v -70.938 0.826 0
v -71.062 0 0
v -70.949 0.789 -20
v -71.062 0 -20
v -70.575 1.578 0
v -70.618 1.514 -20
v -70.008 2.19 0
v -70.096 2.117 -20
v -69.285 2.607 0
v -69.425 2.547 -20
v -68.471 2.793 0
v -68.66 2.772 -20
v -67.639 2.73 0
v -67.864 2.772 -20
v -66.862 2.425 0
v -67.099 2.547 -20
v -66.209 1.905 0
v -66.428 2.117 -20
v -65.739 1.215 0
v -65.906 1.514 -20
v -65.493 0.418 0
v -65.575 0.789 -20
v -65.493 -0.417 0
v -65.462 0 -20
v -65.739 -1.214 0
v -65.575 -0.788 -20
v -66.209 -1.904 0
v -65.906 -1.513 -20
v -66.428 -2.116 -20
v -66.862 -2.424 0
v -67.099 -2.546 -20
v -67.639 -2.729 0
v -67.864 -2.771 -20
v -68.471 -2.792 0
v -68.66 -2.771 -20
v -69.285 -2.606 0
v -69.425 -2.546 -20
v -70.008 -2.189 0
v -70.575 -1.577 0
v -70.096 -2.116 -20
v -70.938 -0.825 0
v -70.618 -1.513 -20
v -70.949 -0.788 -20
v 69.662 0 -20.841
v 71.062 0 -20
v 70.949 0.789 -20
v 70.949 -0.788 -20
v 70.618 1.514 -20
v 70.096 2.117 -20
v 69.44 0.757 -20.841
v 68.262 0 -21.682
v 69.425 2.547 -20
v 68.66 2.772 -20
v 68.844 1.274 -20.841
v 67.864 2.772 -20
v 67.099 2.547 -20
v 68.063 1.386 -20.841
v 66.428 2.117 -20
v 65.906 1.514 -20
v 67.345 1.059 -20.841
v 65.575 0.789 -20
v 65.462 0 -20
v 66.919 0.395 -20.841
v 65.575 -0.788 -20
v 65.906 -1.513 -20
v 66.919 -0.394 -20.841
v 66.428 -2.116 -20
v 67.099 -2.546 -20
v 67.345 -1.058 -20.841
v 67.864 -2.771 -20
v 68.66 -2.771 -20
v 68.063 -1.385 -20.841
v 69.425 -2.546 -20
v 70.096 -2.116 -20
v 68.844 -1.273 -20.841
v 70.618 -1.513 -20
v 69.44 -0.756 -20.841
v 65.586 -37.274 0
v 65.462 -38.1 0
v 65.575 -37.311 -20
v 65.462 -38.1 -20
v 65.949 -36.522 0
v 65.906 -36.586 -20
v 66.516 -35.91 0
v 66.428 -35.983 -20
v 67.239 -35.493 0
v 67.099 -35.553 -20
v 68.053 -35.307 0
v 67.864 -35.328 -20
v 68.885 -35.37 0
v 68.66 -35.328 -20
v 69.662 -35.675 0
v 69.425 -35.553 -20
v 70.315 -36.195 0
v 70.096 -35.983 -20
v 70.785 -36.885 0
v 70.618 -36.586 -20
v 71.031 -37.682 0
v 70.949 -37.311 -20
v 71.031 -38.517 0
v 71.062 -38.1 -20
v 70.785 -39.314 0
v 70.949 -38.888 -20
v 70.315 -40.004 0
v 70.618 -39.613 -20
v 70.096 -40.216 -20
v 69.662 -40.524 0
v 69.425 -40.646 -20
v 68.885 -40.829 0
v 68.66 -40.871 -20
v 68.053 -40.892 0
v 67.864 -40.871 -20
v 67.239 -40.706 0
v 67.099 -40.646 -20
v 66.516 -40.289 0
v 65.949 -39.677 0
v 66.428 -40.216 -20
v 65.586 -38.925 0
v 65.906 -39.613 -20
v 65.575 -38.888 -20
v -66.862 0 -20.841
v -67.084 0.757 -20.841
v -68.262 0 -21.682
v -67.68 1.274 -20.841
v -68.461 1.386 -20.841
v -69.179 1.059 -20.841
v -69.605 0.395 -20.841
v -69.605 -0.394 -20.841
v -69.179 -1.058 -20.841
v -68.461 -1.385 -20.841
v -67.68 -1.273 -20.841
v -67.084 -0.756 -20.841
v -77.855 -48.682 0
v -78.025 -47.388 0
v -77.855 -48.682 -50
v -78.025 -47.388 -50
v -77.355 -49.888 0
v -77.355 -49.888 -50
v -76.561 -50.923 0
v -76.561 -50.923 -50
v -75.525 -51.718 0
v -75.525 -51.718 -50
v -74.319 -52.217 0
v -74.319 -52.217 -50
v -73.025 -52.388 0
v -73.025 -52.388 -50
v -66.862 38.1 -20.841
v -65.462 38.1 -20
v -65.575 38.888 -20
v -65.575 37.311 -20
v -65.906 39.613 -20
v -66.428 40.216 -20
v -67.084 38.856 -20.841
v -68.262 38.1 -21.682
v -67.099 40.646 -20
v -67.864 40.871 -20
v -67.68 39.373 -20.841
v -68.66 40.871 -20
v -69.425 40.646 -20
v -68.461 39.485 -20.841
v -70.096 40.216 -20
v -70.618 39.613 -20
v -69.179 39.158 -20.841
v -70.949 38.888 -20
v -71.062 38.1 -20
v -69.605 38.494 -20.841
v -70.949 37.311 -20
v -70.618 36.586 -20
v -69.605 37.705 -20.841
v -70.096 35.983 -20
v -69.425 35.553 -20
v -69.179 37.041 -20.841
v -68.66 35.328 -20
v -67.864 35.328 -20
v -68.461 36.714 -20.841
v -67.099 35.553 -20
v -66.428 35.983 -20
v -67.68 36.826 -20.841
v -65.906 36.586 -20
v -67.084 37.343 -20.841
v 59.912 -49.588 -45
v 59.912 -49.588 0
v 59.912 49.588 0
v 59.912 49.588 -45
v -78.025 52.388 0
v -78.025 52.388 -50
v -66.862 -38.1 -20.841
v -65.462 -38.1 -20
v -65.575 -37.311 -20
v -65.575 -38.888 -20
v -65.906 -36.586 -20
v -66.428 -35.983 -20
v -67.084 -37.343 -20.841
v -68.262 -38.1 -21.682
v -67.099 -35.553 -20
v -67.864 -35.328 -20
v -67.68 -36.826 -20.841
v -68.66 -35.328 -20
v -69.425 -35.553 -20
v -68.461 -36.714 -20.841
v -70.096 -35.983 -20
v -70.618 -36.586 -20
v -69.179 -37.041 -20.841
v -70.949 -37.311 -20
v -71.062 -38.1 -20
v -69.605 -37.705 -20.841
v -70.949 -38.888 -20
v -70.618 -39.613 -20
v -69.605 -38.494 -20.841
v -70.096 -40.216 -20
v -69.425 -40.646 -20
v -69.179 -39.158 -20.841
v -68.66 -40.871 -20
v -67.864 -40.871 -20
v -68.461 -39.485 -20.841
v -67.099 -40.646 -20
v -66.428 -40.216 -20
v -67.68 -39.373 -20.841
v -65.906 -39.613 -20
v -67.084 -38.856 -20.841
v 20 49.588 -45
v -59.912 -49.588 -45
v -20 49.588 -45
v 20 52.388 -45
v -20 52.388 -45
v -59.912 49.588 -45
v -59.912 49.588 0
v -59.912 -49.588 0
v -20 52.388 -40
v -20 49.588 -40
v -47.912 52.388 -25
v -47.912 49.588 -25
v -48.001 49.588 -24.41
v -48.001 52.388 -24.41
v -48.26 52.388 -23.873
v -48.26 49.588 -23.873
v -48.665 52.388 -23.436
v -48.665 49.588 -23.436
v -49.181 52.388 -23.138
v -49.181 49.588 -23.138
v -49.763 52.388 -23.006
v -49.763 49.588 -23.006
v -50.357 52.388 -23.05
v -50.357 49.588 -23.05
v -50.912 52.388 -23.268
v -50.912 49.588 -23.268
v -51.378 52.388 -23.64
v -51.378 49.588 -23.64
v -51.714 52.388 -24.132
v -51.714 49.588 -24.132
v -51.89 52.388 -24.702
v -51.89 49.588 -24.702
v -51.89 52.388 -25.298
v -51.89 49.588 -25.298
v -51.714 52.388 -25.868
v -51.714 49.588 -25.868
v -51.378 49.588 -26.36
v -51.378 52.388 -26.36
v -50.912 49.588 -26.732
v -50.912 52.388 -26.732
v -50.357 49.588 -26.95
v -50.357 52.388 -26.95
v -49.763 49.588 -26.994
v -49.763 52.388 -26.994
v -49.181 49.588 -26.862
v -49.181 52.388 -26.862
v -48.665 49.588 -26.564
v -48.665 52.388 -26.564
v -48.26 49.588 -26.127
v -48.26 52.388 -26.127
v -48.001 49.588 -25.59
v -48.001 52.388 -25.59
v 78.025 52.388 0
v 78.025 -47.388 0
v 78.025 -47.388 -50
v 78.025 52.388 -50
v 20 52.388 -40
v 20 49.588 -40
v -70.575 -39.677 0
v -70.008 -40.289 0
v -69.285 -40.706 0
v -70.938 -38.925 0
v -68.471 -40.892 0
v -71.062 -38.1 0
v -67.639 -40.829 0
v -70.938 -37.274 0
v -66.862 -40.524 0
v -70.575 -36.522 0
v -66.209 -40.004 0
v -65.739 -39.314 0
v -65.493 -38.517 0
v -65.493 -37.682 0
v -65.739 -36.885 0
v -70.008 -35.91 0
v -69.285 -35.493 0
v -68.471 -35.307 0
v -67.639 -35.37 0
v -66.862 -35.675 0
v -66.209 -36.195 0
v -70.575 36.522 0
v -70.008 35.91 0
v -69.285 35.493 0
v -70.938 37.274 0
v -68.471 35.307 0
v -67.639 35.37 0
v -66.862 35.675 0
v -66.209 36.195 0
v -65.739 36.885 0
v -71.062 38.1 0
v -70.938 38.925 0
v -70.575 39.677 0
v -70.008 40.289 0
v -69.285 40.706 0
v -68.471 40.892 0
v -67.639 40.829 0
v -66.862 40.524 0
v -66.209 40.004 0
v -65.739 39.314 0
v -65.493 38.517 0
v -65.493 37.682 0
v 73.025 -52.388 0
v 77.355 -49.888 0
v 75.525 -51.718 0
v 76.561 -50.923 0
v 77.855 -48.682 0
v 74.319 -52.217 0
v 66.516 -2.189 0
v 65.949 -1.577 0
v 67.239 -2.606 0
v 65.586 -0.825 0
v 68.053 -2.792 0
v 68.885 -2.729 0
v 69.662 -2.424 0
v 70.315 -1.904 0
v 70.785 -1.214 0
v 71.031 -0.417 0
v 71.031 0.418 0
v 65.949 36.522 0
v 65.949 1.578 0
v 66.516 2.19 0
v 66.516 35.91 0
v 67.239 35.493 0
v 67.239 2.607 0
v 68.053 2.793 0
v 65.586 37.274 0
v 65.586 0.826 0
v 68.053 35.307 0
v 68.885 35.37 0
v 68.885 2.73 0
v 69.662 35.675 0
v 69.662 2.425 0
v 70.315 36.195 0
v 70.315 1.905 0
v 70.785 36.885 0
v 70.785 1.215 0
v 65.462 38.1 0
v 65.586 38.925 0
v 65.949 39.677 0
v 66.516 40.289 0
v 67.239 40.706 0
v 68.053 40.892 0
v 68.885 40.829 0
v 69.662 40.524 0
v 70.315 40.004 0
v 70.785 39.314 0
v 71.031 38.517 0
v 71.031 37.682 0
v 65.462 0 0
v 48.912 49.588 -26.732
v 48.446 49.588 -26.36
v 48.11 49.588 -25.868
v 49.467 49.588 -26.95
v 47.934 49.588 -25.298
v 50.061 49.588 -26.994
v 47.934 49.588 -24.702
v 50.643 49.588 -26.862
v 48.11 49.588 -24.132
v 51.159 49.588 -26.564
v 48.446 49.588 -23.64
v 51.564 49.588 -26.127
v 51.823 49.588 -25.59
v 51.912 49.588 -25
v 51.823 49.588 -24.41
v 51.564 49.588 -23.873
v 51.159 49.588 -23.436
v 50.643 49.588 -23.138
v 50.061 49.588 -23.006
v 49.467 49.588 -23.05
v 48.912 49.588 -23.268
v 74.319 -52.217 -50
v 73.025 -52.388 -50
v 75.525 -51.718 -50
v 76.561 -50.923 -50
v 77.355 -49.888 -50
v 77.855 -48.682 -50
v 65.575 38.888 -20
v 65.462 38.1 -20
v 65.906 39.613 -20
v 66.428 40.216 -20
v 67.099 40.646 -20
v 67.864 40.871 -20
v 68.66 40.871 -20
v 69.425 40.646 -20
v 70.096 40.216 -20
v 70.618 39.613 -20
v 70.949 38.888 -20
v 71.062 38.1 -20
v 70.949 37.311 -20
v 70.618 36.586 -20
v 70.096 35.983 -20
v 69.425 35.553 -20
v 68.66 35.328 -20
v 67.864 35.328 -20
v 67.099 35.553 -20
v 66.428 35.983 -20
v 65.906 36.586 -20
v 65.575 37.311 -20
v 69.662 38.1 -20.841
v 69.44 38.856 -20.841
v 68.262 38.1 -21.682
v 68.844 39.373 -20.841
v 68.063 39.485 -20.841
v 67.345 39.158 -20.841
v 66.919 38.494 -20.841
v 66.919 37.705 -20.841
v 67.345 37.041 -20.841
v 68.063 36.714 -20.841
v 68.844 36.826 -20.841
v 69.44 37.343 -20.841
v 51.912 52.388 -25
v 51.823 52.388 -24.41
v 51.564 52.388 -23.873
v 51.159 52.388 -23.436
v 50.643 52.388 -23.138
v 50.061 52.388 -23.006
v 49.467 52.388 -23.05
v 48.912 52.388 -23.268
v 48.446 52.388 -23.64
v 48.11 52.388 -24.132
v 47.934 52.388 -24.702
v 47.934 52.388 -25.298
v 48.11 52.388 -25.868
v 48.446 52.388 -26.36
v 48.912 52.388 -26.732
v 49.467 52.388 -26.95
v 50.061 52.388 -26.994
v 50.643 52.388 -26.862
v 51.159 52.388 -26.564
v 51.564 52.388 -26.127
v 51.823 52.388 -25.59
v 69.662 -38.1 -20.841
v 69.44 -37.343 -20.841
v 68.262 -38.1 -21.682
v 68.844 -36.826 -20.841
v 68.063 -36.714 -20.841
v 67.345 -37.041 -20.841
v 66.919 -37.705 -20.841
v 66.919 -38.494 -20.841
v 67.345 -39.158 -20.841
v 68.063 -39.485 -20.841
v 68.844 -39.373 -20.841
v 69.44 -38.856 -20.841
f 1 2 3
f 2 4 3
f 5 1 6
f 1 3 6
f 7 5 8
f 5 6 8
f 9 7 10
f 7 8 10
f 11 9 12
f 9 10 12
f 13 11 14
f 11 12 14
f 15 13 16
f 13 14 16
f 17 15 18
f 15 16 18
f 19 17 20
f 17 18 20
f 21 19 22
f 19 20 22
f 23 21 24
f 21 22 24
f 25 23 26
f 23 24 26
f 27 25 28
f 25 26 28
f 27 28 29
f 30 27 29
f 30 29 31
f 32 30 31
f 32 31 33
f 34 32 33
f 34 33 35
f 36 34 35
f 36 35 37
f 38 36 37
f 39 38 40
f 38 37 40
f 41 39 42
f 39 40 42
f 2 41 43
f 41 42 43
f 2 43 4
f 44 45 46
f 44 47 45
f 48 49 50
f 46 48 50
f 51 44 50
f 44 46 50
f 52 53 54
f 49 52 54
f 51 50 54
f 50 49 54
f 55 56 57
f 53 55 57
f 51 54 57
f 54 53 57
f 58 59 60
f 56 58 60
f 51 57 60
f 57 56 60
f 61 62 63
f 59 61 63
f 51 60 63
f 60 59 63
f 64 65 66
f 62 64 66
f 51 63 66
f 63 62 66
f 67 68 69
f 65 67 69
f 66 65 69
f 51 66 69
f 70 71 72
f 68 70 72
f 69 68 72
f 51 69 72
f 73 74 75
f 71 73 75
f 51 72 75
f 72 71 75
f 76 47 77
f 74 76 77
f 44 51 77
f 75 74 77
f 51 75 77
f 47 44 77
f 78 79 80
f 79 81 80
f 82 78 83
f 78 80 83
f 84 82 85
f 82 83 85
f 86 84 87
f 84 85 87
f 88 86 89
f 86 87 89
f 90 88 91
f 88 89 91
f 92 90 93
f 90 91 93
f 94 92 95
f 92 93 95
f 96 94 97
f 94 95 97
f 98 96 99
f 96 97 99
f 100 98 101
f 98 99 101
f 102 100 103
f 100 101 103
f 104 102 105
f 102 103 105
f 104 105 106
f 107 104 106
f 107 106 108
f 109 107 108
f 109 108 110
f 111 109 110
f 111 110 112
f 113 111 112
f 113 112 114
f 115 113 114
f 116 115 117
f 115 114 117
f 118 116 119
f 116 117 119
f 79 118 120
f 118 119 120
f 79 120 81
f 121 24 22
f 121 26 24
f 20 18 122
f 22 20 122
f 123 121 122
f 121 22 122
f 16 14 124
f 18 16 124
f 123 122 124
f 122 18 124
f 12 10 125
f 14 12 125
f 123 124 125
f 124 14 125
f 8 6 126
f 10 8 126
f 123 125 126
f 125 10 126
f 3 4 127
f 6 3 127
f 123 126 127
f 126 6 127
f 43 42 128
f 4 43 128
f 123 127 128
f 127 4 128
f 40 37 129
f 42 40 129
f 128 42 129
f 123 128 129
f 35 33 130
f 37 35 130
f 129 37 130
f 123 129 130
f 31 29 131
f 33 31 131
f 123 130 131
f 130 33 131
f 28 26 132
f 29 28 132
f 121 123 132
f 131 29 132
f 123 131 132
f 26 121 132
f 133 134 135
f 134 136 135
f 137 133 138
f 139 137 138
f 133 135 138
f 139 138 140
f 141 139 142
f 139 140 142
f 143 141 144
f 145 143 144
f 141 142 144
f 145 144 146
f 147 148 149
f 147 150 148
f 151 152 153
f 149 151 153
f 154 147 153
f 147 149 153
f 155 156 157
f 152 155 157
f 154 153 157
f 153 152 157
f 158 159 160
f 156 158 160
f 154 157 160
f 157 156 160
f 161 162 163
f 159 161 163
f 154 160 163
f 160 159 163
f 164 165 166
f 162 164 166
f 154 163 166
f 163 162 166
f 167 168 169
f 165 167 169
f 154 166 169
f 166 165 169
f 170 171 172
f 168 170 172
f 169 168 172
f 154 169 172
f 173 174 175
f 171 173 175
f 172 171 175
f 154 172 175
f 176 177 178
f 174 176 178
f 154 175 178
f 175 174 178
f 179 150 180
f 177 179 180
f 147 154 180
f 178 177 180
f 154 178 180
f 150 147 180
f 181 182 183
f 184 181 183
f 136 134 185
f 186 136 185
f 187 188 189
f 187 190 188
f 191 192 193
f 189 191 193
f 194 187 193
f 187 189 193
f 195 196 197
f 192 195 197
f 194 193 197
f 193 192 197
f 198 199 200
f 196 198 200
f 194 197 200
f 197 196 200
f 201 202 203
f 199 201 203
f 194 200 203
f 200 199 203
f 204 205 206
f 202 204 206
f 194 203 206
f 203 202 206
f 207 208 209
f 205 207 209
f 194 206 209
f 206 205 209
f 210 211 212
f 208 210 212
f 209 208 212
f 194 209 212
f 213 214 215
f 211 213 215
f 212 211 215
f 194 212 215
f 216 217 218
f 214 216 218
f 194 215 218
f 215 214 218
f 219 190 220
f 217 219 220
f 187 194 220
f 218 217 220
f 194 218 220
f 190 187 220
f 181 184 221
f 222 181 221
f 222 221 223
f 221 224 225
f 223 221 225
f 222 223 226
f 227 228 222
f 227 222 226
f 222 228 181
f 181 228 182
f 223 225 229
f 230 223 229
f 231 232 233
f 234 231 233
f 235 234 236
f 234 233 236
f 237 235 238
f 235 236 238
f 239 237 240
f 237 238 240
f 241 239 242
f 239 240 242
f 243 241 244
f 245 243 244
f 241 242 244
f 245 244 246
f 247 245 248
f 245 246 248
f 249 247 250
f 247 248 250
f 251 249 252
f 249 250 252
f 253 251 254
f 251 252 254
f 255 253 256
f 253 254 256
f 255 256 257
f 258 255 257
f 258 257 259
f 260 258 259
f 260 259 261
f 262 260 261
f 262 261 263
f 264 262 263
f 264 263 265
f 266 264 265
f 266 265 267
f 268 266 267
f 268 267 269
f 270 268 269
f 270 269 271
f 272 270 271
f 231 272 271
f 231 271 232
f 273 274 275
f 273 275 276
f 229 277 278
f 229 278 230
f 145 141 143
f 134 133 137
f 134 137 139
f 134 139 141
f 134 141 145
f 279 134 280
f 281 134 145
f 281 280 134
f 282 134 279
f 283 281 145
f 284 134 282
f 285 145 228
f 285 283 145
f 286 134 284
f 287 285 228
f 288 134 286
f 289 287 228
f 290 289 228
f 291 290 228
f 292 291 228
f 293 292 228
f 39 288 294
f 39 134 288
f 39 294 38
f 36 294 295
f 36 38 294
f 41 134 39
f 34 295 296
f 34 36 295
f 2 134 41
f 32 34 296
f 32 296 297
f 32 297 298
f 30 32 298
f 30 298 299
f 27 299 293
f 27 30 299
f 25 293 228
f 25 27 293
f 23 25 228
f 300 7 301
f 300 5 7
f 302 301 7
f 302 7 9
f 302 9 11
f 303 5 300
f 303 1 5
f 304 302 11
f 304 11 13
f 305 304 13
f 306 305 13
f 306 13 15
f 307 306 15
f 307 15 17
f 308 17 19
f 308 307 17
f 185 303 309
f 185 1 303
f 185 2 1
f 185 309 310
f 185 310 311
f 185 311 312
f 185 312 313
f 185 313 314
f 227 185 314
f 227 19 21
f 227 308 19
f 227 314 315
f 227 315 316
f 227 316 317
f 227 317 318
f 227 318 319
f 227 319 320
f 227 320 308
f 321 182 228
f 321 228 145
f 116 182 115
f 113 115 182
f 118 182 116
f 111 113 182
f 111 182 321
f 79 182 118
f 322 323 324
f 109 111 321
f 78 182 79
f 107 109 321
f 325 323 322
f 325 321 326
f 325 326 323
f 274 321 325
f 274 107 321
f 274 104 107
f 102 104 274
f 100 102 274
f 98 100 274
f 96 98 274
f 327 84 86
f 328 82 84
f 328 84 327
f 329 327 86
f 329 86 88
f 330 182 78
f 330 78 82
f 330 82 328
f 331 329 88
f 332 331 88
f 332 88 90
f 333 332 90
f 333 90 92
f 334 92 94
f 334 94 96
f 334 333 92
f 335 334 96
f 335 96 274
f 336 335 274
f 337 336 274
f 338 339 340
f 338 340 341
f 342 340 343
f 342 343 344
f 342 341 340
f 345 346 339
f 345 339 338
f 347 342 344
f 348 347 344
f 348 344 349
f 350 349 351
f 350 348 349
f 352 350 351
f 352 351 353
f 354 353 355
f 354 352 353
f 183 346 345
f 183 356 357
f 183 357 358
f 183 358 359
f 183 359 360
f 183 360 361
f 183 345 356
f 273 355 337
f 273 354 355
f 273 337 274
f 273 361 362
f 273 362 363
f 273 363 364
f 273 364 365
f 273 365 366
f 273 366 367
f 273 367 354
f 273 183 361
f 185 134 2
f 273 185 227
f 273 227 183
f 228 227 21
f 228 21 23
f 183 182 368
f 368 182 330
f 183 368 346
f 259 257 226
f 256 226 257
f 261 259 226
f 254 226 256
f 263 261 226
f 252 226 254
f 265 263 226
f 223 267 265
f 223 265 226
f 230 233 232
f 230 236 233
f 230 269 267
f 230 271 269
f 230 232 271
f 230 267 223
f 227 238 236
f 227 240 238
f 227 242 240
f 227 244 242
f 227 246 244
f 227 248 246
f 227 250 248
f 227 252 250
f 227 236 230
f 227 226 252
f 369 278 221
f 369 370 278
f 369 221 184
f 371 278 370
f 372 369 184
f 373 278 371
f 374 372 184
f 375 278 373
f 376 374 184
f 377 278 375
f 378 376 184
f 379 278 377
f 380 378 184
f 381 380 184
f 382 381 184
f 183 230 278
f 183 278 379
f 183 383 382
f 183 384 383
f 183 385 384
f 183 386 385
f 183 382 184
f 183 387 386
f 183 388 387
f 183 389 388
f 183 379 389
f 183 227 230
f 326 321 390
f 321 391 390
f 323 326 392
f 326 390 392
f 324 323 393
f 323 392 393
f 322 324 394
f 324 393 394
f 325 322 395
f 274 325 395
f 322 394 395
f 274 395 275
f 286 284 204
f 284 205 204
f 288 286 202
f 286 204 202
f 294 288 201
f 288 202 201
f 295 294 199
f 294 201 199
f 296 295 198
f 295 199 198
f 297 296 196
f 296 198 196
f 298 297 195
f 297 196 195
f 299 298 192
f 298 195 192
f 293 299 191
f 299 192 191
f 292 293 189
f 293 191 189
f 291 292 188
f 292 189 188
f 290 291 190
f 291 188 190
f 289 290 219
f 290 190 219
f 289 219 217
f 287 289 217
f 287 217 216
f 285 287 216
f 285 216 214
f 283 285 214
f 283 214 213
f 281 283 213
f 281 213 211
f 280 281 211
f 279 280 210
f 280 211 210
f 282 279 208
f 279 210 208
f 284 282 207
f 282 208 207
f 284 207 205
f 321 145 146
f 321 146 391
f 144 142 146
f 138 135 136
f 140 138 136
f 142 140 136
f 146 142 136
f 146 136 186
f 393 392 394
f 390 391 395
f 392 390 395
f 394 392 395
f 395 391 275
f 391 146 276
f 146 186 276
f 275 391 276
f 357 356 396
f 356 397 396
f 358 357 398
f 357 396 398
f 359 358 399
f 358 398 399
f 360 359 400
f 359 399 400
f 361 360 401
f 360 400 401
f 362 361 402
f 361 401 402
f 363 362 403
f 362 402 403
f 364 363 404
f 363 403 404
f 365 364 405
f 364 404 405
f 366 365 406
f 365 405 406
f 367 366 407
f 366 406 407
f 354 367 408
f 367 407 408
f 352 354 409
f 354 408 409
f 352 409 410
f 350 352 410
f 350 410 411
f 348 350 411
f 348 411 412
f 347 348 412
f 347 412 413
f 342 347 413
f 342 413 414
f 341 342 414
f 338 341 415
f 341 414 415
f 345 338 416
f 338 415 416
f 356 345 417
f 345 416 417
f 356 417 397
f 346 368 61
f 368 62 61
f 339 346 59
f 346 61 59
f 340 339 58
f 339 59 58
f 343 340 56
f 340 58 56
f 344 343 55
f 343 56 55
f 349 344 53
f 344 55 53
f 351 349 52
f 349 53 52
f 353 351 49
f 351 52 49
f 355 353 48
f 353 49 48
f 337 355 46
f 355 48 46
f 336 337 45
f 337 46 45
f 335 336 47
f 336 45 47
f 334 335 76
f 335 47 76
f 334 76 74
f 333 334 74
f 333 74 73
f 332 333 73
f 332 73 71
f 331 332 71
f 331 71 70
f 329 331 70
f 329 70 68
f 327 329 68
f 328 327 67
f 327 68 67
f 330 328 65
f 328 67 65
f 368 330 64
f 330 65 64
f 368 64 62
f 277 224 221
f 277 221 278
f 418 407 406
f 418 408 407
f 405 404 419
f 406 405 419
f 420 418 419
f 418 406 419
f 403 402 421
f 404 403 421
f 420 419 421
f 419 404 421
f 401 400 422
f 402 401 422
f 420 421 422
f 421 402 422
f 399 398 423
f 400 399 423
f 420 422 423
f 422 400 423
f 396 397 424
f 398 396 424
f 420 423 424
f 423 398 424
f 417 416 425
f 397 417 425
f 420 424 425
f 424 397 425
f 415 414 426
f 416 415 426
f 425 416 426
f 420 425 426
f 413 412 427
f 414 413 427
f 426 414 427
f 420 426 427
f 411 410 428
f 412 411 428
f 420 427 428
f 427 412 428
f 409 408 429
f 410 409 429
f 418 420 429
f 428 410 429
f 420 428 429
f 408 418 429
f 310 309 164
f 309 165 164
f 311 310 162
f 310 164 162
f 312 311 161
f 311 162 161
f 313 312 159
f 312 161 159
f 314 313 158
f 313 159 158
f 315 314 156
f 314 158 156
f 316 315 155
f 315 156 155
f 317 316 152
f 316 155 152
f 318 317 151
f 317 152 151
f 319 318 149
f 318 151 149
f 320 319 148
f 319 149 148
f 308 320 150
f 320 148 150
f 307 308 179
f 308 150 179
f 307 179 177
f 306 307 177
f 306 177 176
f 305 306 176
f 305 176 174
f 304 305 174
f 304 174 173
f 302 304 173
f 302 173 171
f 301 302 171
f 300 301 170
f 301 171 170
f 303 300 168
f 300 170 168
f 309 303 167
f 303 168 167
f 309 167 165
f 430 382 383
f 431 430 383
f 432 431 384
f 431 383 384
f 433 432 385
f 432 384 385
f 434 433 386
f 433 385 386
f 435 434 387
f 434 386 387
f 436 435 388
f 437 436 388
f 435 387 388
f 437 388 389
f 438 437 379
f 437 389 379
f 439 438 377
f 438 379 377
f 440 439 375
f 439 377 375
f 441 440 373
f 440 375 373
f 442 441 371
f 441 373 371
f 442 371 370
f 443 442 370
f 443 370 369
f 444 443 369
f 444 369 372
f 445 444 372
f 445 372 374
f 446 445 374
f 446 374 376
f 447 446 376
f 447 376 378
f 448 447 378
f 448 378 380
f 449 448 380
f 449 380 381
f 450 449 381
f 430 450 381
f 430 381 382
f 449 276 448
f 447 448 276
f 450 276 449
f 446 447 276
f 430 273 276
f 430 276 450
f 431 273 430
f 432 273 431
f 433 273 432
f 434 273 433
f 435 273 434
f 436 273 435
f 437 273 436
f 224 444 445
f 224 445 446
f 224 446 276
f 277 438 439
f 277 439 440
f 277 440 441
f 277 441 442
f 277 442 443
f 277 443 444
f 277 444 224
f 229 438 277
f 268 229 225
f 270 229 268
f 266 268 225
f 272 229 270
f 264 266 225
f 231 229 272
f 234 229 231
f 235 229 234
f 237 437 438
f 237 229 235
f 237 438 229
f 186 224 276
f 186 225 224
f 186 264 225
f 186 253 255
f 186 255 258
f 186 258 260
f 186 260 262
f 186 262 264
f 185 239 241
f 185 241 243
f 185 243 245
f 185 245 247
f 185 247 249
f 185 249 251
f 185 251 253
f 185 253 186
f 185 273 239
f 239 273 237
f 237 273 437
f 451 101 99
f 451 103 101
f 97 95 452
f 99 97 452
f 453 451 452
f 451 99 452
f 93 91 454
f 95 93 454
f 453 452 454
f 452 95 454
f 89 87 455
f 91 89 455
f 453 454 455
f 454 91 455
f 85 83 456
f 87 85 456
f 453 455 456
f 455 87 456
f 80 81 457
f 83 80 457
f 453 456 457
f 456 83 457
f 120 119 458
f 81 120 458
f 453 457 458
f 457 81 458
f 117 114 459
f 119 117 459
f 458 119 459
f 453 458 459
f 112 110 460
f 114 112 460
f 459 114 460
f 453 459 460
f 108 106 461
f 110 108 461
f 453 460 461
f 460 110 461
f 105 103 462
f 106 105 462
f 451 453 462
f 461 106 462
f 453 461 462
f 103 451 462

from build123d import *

# Parameters (mm, degrees)
F0_W     = 5
F0_H     = 104.775
F0_W_2   = 146.05
F0_R     = 3.24
F1_DEPTH = 50
F2_W     = 119.824
F2_H     = 99.175
F3_DEPTH = 45
F4_D     = 5.6
F4_DEPTH = 20
F4_TIP   = 1.6824097333
F5_W     = 40
F5_H     = 5
F6_DEPTH = 2.8
F7_D     = 4
F7_DEPTH = 20
F7_TIP   = 1.2017212381
F8_R     = 5


with BuildPart() as f1:
    # F0 (on Top) → F1 (new body)
    with BuildSketch(Plane.XY):
        with Locations((-75.525, 0)):
            Rectangle(F0_W, F0_H)
        Rectangle(F0_W_2, F0_H)
        with Locations((-68.262, -38.0995)):
            Circle(F0_R, mode=Mode.SUBTRACT)
        with Locations((68.262, -38.0995)):
            Circle(F0_R, mode=Mode.SUBTRACT)
        with Locations((-68.262, 0.0005)):
            Circle(F0_R, mode=Mode.SUBTRACT)
        with BuildLine():
            ThreePointArc((68.262, 44.4495), (61.912, 38.0995), (68.262, 31.7495))
            Line((68.262, 31.7495), (72.225, 31.7495))
            Line((72.225, 31.7495), (72.225, 6.3505))
            Line((72.225, 6.3505), (68.262, 6.3505))
            ThreePointArc((68.262, 6.3505), (61.912, 0.0005), (68.262, -6.3495))
            Line((68.262, -6.3495), (72.225, -6.3495))
            Line((72.225, -6.3495), (72.225, -31.7495))
            Line((72.225, -31.7495), (68.262, -31.7495))
            ThreePointArc((68.262, -31.7495), (61.912, -38.0995), (68.262, -44.4495))
            Line((68.262, -44.4495), (72.225, -44.4495))
            Line((72.225, -44.4495), (72.225, -51.5875))
            Line((72.225, -51.5875), (-72.225, -51.5875))
            Line((-72.225, -51.5875), (-72.225, -44.4495))
            Line((-72.225, -44.4495), (-68.262, -44.4495))
            ThreePointArc((-68.262, -44.4495), (-61.912, -38.0995), (-68.262, -31.7495))
            Line((-68.262, -31.7495), (-72.225, -31.7495))
            Line((-72.225, -31.7495), (-72.225, -6.3495))
            Line((-72.225, -6.3495), (-68.262, -6.3495))
            ThreePointArc((-68.262, -6.3495), (-61.912, 0.0005), (-68.262, 6.3505))
            Line((-68.262, 6.3505), (-72.225, 6.3505))
            Line((-72.225, 6.3505), (-72.225, 31.7495))
            Line((-72.225, 31.7495), (-68.262, 31.7495))
            ThreePointArc((-68.262, 31.7495), (-61.912, 38.0995), (-68.262, 44.4495))
            Line((-68.262, 44.4495), (-72.225, 44.4495))
            Line((-72.225, 44.4495), (-72.225, 51.5875))
            Line((-72.225, 51.5875), (72.225, 51.5875))
            Line((72.225, 51.5875), (72.225, 44.4495))
            Line((72.225, 44.4495), (68.262, 44.4495))
        make_face(mode=Mode.SUBTRACT)
        with Locations((-68.262, 38.0995)):
            Circle(F0_R, mode=Mode.SUBTRACT)
        with Locations((68.262, 0.0005)):
            Circle(F0_R, mode=Mode.SUBTRACT)
        with Locations((68.262, 38.0995)):
            Circle(F0_R, mode=Mode.SUBTRACT)
        with Locations((75.525, 0)):
            Rectangle(F0_W, F0_H)
        with Locations((-68.262, 38.0995)):
            Circle(F0_R)
        with BuildLine():
            Line((72.225, 31.7495), (68.262, 31.7495))
            ThreePointArc((68.262, 31.7495), (61.912, 38.0995), (68.262, 44.4495))
            Line((68.262, 44.4495), (72.225, 44.4495))
            Line((72.225, 44.4495), (72.225, 51.5875))
            Line((72.225, 51.5875), (-72.225, 51.5875))
            Line((-72.225, 51.5875), (-72.225, 44.4495))
            Line((-72.225, 44.4495), (-68.262, 44.4495))
            ThreePointArc((-68.262, 44.4495), (-61.912, 38.0995), (-68.262, 31.7495))
            Line((-68.262, 31.7495), (-72.225, 31.7495))
            Line((-72.225, 31.7495), (-72.225, 6.3505))
            Line((-72.225, 6.3505), (-68.262, 6.3505))
            ThreePointArc((-68.262, 6.3505), (-61.912, 0.0005), (-68.262, -6.3495))
            Line((-68.262, -6.3495), (-72.225, -6.3495))
            Line((-72.225, -6.3495), (-72.225, -31.7495))
            Line((-72.225, -31.7495), (-68.262, -31.7495))
            ThreePointArc((-68.262, -31.7495), (-61.912, -38.0995), (-68.262, -44.4495))
            Line((-68.262, -44.4495), (-72.225, -44.4495))
            Line((-72.225, -44.4495), (-72.225, -51.5875))
            Line((-72.225, -51.5875), (72.225, -51.5875))
            Line((72.225, -51.5875), (72.225, -44.4495))
            Line((72.225, -44.4495), (68.262, -44.4495))
            ThreePointArc((68.262, -44.4495), (61.912, -38.0995), (68.262, -31.7495))
            Line((68.262, -31.7495), (72.225, -31.7495))
            Line((72.225, -31.7495), (72.225, -6.3495))
            Line((72.225, -6.3495), (68.262, -6.3495))
            ThreePointArc((68.262, -6.3495), (61.912, 0.0005), (68.262, 6.3505))
            Line((68.262, 6.3505), (72.225, 6.3505))
            Line((72.225, 6.3505), (72.225, 31.7495))
        make_face()
        with Locations((-68.262, 0.0005)):
            Circle(F0_R)
        with Locations((-68.262, -38.0995)):
            Circle(F0_R)
        with Locations((68.262, -38.0995)):
            Circle(F0_R)
        with Locations((68.262, 0.0005)):
            Circle(F0_R)
        with Locations((68.262, 38.0995)):
            Circle(F0_R)
    extrude(amount=-F1_DEPTH)

    # F2 (on face) → F3 (cut)
    with BuildSketch(Plane.XY):
        Rectangle(F2_W, F2_H)
    extrude(amount=-F3_DEPTH, mode=Mode.SUBTRACT)

    # F4
    with Locations(Plane.XY):
        with Locations((-68.262, 38.0995), (-68.262, 0.0005), (-68.262, -38.0995), (68.262, -38.0995), (68.262, 38.0995), (68.262, 0.0005)):
            Hole(F4_D / 2, depth=F4_DEPTH)
            with Locations((0, 0, -(F4_DEPTH + F4_TIP / 2))):  # 118° drill point
                Cone(0, F4_D / 2, F4_TIP, mode=Mode.SUBTRACT)

    # F5 (on face) → F6 (cut, through all)
    with BuildSketch(Plane(origin=(0, 52.3875, 0), x_dir=(-1, 0, 0), z_dir=(0, 1, 0))):
        with Locations((0, -42.5)):
            Rectangle(F5_W, F5_H)
    extrude(amount=-F6_DEPTH, mode=Mode.SUBTRACT)

    # F7
    with Locations(Plane(origin=(0, 52.3875, 0), x_dir=(-1, 0, 0), z_dir=(0, 1, 0))):
        with Locations((-49.912, -25), (49.912, -25)):
            Hole(F7_D / 2, depth=F7_DEPTH)
            with Locations((0, 0, -(F7_DEPTH + F7_TIP / 2))):  # 118° drill point
                Cone(0, F7_D / 2, F7_TIP, mode=Mode.SUBTRACT)

    # F8
    f8_edges = [f1.edges().sort_by_distance(p)[0] for p in [
        (-78.025, -52.3875, -25),
        (78.025, -52.3875, -25),
    ]]
    fillet(f8_edges, radius=F8_R)


solid = f1.part
